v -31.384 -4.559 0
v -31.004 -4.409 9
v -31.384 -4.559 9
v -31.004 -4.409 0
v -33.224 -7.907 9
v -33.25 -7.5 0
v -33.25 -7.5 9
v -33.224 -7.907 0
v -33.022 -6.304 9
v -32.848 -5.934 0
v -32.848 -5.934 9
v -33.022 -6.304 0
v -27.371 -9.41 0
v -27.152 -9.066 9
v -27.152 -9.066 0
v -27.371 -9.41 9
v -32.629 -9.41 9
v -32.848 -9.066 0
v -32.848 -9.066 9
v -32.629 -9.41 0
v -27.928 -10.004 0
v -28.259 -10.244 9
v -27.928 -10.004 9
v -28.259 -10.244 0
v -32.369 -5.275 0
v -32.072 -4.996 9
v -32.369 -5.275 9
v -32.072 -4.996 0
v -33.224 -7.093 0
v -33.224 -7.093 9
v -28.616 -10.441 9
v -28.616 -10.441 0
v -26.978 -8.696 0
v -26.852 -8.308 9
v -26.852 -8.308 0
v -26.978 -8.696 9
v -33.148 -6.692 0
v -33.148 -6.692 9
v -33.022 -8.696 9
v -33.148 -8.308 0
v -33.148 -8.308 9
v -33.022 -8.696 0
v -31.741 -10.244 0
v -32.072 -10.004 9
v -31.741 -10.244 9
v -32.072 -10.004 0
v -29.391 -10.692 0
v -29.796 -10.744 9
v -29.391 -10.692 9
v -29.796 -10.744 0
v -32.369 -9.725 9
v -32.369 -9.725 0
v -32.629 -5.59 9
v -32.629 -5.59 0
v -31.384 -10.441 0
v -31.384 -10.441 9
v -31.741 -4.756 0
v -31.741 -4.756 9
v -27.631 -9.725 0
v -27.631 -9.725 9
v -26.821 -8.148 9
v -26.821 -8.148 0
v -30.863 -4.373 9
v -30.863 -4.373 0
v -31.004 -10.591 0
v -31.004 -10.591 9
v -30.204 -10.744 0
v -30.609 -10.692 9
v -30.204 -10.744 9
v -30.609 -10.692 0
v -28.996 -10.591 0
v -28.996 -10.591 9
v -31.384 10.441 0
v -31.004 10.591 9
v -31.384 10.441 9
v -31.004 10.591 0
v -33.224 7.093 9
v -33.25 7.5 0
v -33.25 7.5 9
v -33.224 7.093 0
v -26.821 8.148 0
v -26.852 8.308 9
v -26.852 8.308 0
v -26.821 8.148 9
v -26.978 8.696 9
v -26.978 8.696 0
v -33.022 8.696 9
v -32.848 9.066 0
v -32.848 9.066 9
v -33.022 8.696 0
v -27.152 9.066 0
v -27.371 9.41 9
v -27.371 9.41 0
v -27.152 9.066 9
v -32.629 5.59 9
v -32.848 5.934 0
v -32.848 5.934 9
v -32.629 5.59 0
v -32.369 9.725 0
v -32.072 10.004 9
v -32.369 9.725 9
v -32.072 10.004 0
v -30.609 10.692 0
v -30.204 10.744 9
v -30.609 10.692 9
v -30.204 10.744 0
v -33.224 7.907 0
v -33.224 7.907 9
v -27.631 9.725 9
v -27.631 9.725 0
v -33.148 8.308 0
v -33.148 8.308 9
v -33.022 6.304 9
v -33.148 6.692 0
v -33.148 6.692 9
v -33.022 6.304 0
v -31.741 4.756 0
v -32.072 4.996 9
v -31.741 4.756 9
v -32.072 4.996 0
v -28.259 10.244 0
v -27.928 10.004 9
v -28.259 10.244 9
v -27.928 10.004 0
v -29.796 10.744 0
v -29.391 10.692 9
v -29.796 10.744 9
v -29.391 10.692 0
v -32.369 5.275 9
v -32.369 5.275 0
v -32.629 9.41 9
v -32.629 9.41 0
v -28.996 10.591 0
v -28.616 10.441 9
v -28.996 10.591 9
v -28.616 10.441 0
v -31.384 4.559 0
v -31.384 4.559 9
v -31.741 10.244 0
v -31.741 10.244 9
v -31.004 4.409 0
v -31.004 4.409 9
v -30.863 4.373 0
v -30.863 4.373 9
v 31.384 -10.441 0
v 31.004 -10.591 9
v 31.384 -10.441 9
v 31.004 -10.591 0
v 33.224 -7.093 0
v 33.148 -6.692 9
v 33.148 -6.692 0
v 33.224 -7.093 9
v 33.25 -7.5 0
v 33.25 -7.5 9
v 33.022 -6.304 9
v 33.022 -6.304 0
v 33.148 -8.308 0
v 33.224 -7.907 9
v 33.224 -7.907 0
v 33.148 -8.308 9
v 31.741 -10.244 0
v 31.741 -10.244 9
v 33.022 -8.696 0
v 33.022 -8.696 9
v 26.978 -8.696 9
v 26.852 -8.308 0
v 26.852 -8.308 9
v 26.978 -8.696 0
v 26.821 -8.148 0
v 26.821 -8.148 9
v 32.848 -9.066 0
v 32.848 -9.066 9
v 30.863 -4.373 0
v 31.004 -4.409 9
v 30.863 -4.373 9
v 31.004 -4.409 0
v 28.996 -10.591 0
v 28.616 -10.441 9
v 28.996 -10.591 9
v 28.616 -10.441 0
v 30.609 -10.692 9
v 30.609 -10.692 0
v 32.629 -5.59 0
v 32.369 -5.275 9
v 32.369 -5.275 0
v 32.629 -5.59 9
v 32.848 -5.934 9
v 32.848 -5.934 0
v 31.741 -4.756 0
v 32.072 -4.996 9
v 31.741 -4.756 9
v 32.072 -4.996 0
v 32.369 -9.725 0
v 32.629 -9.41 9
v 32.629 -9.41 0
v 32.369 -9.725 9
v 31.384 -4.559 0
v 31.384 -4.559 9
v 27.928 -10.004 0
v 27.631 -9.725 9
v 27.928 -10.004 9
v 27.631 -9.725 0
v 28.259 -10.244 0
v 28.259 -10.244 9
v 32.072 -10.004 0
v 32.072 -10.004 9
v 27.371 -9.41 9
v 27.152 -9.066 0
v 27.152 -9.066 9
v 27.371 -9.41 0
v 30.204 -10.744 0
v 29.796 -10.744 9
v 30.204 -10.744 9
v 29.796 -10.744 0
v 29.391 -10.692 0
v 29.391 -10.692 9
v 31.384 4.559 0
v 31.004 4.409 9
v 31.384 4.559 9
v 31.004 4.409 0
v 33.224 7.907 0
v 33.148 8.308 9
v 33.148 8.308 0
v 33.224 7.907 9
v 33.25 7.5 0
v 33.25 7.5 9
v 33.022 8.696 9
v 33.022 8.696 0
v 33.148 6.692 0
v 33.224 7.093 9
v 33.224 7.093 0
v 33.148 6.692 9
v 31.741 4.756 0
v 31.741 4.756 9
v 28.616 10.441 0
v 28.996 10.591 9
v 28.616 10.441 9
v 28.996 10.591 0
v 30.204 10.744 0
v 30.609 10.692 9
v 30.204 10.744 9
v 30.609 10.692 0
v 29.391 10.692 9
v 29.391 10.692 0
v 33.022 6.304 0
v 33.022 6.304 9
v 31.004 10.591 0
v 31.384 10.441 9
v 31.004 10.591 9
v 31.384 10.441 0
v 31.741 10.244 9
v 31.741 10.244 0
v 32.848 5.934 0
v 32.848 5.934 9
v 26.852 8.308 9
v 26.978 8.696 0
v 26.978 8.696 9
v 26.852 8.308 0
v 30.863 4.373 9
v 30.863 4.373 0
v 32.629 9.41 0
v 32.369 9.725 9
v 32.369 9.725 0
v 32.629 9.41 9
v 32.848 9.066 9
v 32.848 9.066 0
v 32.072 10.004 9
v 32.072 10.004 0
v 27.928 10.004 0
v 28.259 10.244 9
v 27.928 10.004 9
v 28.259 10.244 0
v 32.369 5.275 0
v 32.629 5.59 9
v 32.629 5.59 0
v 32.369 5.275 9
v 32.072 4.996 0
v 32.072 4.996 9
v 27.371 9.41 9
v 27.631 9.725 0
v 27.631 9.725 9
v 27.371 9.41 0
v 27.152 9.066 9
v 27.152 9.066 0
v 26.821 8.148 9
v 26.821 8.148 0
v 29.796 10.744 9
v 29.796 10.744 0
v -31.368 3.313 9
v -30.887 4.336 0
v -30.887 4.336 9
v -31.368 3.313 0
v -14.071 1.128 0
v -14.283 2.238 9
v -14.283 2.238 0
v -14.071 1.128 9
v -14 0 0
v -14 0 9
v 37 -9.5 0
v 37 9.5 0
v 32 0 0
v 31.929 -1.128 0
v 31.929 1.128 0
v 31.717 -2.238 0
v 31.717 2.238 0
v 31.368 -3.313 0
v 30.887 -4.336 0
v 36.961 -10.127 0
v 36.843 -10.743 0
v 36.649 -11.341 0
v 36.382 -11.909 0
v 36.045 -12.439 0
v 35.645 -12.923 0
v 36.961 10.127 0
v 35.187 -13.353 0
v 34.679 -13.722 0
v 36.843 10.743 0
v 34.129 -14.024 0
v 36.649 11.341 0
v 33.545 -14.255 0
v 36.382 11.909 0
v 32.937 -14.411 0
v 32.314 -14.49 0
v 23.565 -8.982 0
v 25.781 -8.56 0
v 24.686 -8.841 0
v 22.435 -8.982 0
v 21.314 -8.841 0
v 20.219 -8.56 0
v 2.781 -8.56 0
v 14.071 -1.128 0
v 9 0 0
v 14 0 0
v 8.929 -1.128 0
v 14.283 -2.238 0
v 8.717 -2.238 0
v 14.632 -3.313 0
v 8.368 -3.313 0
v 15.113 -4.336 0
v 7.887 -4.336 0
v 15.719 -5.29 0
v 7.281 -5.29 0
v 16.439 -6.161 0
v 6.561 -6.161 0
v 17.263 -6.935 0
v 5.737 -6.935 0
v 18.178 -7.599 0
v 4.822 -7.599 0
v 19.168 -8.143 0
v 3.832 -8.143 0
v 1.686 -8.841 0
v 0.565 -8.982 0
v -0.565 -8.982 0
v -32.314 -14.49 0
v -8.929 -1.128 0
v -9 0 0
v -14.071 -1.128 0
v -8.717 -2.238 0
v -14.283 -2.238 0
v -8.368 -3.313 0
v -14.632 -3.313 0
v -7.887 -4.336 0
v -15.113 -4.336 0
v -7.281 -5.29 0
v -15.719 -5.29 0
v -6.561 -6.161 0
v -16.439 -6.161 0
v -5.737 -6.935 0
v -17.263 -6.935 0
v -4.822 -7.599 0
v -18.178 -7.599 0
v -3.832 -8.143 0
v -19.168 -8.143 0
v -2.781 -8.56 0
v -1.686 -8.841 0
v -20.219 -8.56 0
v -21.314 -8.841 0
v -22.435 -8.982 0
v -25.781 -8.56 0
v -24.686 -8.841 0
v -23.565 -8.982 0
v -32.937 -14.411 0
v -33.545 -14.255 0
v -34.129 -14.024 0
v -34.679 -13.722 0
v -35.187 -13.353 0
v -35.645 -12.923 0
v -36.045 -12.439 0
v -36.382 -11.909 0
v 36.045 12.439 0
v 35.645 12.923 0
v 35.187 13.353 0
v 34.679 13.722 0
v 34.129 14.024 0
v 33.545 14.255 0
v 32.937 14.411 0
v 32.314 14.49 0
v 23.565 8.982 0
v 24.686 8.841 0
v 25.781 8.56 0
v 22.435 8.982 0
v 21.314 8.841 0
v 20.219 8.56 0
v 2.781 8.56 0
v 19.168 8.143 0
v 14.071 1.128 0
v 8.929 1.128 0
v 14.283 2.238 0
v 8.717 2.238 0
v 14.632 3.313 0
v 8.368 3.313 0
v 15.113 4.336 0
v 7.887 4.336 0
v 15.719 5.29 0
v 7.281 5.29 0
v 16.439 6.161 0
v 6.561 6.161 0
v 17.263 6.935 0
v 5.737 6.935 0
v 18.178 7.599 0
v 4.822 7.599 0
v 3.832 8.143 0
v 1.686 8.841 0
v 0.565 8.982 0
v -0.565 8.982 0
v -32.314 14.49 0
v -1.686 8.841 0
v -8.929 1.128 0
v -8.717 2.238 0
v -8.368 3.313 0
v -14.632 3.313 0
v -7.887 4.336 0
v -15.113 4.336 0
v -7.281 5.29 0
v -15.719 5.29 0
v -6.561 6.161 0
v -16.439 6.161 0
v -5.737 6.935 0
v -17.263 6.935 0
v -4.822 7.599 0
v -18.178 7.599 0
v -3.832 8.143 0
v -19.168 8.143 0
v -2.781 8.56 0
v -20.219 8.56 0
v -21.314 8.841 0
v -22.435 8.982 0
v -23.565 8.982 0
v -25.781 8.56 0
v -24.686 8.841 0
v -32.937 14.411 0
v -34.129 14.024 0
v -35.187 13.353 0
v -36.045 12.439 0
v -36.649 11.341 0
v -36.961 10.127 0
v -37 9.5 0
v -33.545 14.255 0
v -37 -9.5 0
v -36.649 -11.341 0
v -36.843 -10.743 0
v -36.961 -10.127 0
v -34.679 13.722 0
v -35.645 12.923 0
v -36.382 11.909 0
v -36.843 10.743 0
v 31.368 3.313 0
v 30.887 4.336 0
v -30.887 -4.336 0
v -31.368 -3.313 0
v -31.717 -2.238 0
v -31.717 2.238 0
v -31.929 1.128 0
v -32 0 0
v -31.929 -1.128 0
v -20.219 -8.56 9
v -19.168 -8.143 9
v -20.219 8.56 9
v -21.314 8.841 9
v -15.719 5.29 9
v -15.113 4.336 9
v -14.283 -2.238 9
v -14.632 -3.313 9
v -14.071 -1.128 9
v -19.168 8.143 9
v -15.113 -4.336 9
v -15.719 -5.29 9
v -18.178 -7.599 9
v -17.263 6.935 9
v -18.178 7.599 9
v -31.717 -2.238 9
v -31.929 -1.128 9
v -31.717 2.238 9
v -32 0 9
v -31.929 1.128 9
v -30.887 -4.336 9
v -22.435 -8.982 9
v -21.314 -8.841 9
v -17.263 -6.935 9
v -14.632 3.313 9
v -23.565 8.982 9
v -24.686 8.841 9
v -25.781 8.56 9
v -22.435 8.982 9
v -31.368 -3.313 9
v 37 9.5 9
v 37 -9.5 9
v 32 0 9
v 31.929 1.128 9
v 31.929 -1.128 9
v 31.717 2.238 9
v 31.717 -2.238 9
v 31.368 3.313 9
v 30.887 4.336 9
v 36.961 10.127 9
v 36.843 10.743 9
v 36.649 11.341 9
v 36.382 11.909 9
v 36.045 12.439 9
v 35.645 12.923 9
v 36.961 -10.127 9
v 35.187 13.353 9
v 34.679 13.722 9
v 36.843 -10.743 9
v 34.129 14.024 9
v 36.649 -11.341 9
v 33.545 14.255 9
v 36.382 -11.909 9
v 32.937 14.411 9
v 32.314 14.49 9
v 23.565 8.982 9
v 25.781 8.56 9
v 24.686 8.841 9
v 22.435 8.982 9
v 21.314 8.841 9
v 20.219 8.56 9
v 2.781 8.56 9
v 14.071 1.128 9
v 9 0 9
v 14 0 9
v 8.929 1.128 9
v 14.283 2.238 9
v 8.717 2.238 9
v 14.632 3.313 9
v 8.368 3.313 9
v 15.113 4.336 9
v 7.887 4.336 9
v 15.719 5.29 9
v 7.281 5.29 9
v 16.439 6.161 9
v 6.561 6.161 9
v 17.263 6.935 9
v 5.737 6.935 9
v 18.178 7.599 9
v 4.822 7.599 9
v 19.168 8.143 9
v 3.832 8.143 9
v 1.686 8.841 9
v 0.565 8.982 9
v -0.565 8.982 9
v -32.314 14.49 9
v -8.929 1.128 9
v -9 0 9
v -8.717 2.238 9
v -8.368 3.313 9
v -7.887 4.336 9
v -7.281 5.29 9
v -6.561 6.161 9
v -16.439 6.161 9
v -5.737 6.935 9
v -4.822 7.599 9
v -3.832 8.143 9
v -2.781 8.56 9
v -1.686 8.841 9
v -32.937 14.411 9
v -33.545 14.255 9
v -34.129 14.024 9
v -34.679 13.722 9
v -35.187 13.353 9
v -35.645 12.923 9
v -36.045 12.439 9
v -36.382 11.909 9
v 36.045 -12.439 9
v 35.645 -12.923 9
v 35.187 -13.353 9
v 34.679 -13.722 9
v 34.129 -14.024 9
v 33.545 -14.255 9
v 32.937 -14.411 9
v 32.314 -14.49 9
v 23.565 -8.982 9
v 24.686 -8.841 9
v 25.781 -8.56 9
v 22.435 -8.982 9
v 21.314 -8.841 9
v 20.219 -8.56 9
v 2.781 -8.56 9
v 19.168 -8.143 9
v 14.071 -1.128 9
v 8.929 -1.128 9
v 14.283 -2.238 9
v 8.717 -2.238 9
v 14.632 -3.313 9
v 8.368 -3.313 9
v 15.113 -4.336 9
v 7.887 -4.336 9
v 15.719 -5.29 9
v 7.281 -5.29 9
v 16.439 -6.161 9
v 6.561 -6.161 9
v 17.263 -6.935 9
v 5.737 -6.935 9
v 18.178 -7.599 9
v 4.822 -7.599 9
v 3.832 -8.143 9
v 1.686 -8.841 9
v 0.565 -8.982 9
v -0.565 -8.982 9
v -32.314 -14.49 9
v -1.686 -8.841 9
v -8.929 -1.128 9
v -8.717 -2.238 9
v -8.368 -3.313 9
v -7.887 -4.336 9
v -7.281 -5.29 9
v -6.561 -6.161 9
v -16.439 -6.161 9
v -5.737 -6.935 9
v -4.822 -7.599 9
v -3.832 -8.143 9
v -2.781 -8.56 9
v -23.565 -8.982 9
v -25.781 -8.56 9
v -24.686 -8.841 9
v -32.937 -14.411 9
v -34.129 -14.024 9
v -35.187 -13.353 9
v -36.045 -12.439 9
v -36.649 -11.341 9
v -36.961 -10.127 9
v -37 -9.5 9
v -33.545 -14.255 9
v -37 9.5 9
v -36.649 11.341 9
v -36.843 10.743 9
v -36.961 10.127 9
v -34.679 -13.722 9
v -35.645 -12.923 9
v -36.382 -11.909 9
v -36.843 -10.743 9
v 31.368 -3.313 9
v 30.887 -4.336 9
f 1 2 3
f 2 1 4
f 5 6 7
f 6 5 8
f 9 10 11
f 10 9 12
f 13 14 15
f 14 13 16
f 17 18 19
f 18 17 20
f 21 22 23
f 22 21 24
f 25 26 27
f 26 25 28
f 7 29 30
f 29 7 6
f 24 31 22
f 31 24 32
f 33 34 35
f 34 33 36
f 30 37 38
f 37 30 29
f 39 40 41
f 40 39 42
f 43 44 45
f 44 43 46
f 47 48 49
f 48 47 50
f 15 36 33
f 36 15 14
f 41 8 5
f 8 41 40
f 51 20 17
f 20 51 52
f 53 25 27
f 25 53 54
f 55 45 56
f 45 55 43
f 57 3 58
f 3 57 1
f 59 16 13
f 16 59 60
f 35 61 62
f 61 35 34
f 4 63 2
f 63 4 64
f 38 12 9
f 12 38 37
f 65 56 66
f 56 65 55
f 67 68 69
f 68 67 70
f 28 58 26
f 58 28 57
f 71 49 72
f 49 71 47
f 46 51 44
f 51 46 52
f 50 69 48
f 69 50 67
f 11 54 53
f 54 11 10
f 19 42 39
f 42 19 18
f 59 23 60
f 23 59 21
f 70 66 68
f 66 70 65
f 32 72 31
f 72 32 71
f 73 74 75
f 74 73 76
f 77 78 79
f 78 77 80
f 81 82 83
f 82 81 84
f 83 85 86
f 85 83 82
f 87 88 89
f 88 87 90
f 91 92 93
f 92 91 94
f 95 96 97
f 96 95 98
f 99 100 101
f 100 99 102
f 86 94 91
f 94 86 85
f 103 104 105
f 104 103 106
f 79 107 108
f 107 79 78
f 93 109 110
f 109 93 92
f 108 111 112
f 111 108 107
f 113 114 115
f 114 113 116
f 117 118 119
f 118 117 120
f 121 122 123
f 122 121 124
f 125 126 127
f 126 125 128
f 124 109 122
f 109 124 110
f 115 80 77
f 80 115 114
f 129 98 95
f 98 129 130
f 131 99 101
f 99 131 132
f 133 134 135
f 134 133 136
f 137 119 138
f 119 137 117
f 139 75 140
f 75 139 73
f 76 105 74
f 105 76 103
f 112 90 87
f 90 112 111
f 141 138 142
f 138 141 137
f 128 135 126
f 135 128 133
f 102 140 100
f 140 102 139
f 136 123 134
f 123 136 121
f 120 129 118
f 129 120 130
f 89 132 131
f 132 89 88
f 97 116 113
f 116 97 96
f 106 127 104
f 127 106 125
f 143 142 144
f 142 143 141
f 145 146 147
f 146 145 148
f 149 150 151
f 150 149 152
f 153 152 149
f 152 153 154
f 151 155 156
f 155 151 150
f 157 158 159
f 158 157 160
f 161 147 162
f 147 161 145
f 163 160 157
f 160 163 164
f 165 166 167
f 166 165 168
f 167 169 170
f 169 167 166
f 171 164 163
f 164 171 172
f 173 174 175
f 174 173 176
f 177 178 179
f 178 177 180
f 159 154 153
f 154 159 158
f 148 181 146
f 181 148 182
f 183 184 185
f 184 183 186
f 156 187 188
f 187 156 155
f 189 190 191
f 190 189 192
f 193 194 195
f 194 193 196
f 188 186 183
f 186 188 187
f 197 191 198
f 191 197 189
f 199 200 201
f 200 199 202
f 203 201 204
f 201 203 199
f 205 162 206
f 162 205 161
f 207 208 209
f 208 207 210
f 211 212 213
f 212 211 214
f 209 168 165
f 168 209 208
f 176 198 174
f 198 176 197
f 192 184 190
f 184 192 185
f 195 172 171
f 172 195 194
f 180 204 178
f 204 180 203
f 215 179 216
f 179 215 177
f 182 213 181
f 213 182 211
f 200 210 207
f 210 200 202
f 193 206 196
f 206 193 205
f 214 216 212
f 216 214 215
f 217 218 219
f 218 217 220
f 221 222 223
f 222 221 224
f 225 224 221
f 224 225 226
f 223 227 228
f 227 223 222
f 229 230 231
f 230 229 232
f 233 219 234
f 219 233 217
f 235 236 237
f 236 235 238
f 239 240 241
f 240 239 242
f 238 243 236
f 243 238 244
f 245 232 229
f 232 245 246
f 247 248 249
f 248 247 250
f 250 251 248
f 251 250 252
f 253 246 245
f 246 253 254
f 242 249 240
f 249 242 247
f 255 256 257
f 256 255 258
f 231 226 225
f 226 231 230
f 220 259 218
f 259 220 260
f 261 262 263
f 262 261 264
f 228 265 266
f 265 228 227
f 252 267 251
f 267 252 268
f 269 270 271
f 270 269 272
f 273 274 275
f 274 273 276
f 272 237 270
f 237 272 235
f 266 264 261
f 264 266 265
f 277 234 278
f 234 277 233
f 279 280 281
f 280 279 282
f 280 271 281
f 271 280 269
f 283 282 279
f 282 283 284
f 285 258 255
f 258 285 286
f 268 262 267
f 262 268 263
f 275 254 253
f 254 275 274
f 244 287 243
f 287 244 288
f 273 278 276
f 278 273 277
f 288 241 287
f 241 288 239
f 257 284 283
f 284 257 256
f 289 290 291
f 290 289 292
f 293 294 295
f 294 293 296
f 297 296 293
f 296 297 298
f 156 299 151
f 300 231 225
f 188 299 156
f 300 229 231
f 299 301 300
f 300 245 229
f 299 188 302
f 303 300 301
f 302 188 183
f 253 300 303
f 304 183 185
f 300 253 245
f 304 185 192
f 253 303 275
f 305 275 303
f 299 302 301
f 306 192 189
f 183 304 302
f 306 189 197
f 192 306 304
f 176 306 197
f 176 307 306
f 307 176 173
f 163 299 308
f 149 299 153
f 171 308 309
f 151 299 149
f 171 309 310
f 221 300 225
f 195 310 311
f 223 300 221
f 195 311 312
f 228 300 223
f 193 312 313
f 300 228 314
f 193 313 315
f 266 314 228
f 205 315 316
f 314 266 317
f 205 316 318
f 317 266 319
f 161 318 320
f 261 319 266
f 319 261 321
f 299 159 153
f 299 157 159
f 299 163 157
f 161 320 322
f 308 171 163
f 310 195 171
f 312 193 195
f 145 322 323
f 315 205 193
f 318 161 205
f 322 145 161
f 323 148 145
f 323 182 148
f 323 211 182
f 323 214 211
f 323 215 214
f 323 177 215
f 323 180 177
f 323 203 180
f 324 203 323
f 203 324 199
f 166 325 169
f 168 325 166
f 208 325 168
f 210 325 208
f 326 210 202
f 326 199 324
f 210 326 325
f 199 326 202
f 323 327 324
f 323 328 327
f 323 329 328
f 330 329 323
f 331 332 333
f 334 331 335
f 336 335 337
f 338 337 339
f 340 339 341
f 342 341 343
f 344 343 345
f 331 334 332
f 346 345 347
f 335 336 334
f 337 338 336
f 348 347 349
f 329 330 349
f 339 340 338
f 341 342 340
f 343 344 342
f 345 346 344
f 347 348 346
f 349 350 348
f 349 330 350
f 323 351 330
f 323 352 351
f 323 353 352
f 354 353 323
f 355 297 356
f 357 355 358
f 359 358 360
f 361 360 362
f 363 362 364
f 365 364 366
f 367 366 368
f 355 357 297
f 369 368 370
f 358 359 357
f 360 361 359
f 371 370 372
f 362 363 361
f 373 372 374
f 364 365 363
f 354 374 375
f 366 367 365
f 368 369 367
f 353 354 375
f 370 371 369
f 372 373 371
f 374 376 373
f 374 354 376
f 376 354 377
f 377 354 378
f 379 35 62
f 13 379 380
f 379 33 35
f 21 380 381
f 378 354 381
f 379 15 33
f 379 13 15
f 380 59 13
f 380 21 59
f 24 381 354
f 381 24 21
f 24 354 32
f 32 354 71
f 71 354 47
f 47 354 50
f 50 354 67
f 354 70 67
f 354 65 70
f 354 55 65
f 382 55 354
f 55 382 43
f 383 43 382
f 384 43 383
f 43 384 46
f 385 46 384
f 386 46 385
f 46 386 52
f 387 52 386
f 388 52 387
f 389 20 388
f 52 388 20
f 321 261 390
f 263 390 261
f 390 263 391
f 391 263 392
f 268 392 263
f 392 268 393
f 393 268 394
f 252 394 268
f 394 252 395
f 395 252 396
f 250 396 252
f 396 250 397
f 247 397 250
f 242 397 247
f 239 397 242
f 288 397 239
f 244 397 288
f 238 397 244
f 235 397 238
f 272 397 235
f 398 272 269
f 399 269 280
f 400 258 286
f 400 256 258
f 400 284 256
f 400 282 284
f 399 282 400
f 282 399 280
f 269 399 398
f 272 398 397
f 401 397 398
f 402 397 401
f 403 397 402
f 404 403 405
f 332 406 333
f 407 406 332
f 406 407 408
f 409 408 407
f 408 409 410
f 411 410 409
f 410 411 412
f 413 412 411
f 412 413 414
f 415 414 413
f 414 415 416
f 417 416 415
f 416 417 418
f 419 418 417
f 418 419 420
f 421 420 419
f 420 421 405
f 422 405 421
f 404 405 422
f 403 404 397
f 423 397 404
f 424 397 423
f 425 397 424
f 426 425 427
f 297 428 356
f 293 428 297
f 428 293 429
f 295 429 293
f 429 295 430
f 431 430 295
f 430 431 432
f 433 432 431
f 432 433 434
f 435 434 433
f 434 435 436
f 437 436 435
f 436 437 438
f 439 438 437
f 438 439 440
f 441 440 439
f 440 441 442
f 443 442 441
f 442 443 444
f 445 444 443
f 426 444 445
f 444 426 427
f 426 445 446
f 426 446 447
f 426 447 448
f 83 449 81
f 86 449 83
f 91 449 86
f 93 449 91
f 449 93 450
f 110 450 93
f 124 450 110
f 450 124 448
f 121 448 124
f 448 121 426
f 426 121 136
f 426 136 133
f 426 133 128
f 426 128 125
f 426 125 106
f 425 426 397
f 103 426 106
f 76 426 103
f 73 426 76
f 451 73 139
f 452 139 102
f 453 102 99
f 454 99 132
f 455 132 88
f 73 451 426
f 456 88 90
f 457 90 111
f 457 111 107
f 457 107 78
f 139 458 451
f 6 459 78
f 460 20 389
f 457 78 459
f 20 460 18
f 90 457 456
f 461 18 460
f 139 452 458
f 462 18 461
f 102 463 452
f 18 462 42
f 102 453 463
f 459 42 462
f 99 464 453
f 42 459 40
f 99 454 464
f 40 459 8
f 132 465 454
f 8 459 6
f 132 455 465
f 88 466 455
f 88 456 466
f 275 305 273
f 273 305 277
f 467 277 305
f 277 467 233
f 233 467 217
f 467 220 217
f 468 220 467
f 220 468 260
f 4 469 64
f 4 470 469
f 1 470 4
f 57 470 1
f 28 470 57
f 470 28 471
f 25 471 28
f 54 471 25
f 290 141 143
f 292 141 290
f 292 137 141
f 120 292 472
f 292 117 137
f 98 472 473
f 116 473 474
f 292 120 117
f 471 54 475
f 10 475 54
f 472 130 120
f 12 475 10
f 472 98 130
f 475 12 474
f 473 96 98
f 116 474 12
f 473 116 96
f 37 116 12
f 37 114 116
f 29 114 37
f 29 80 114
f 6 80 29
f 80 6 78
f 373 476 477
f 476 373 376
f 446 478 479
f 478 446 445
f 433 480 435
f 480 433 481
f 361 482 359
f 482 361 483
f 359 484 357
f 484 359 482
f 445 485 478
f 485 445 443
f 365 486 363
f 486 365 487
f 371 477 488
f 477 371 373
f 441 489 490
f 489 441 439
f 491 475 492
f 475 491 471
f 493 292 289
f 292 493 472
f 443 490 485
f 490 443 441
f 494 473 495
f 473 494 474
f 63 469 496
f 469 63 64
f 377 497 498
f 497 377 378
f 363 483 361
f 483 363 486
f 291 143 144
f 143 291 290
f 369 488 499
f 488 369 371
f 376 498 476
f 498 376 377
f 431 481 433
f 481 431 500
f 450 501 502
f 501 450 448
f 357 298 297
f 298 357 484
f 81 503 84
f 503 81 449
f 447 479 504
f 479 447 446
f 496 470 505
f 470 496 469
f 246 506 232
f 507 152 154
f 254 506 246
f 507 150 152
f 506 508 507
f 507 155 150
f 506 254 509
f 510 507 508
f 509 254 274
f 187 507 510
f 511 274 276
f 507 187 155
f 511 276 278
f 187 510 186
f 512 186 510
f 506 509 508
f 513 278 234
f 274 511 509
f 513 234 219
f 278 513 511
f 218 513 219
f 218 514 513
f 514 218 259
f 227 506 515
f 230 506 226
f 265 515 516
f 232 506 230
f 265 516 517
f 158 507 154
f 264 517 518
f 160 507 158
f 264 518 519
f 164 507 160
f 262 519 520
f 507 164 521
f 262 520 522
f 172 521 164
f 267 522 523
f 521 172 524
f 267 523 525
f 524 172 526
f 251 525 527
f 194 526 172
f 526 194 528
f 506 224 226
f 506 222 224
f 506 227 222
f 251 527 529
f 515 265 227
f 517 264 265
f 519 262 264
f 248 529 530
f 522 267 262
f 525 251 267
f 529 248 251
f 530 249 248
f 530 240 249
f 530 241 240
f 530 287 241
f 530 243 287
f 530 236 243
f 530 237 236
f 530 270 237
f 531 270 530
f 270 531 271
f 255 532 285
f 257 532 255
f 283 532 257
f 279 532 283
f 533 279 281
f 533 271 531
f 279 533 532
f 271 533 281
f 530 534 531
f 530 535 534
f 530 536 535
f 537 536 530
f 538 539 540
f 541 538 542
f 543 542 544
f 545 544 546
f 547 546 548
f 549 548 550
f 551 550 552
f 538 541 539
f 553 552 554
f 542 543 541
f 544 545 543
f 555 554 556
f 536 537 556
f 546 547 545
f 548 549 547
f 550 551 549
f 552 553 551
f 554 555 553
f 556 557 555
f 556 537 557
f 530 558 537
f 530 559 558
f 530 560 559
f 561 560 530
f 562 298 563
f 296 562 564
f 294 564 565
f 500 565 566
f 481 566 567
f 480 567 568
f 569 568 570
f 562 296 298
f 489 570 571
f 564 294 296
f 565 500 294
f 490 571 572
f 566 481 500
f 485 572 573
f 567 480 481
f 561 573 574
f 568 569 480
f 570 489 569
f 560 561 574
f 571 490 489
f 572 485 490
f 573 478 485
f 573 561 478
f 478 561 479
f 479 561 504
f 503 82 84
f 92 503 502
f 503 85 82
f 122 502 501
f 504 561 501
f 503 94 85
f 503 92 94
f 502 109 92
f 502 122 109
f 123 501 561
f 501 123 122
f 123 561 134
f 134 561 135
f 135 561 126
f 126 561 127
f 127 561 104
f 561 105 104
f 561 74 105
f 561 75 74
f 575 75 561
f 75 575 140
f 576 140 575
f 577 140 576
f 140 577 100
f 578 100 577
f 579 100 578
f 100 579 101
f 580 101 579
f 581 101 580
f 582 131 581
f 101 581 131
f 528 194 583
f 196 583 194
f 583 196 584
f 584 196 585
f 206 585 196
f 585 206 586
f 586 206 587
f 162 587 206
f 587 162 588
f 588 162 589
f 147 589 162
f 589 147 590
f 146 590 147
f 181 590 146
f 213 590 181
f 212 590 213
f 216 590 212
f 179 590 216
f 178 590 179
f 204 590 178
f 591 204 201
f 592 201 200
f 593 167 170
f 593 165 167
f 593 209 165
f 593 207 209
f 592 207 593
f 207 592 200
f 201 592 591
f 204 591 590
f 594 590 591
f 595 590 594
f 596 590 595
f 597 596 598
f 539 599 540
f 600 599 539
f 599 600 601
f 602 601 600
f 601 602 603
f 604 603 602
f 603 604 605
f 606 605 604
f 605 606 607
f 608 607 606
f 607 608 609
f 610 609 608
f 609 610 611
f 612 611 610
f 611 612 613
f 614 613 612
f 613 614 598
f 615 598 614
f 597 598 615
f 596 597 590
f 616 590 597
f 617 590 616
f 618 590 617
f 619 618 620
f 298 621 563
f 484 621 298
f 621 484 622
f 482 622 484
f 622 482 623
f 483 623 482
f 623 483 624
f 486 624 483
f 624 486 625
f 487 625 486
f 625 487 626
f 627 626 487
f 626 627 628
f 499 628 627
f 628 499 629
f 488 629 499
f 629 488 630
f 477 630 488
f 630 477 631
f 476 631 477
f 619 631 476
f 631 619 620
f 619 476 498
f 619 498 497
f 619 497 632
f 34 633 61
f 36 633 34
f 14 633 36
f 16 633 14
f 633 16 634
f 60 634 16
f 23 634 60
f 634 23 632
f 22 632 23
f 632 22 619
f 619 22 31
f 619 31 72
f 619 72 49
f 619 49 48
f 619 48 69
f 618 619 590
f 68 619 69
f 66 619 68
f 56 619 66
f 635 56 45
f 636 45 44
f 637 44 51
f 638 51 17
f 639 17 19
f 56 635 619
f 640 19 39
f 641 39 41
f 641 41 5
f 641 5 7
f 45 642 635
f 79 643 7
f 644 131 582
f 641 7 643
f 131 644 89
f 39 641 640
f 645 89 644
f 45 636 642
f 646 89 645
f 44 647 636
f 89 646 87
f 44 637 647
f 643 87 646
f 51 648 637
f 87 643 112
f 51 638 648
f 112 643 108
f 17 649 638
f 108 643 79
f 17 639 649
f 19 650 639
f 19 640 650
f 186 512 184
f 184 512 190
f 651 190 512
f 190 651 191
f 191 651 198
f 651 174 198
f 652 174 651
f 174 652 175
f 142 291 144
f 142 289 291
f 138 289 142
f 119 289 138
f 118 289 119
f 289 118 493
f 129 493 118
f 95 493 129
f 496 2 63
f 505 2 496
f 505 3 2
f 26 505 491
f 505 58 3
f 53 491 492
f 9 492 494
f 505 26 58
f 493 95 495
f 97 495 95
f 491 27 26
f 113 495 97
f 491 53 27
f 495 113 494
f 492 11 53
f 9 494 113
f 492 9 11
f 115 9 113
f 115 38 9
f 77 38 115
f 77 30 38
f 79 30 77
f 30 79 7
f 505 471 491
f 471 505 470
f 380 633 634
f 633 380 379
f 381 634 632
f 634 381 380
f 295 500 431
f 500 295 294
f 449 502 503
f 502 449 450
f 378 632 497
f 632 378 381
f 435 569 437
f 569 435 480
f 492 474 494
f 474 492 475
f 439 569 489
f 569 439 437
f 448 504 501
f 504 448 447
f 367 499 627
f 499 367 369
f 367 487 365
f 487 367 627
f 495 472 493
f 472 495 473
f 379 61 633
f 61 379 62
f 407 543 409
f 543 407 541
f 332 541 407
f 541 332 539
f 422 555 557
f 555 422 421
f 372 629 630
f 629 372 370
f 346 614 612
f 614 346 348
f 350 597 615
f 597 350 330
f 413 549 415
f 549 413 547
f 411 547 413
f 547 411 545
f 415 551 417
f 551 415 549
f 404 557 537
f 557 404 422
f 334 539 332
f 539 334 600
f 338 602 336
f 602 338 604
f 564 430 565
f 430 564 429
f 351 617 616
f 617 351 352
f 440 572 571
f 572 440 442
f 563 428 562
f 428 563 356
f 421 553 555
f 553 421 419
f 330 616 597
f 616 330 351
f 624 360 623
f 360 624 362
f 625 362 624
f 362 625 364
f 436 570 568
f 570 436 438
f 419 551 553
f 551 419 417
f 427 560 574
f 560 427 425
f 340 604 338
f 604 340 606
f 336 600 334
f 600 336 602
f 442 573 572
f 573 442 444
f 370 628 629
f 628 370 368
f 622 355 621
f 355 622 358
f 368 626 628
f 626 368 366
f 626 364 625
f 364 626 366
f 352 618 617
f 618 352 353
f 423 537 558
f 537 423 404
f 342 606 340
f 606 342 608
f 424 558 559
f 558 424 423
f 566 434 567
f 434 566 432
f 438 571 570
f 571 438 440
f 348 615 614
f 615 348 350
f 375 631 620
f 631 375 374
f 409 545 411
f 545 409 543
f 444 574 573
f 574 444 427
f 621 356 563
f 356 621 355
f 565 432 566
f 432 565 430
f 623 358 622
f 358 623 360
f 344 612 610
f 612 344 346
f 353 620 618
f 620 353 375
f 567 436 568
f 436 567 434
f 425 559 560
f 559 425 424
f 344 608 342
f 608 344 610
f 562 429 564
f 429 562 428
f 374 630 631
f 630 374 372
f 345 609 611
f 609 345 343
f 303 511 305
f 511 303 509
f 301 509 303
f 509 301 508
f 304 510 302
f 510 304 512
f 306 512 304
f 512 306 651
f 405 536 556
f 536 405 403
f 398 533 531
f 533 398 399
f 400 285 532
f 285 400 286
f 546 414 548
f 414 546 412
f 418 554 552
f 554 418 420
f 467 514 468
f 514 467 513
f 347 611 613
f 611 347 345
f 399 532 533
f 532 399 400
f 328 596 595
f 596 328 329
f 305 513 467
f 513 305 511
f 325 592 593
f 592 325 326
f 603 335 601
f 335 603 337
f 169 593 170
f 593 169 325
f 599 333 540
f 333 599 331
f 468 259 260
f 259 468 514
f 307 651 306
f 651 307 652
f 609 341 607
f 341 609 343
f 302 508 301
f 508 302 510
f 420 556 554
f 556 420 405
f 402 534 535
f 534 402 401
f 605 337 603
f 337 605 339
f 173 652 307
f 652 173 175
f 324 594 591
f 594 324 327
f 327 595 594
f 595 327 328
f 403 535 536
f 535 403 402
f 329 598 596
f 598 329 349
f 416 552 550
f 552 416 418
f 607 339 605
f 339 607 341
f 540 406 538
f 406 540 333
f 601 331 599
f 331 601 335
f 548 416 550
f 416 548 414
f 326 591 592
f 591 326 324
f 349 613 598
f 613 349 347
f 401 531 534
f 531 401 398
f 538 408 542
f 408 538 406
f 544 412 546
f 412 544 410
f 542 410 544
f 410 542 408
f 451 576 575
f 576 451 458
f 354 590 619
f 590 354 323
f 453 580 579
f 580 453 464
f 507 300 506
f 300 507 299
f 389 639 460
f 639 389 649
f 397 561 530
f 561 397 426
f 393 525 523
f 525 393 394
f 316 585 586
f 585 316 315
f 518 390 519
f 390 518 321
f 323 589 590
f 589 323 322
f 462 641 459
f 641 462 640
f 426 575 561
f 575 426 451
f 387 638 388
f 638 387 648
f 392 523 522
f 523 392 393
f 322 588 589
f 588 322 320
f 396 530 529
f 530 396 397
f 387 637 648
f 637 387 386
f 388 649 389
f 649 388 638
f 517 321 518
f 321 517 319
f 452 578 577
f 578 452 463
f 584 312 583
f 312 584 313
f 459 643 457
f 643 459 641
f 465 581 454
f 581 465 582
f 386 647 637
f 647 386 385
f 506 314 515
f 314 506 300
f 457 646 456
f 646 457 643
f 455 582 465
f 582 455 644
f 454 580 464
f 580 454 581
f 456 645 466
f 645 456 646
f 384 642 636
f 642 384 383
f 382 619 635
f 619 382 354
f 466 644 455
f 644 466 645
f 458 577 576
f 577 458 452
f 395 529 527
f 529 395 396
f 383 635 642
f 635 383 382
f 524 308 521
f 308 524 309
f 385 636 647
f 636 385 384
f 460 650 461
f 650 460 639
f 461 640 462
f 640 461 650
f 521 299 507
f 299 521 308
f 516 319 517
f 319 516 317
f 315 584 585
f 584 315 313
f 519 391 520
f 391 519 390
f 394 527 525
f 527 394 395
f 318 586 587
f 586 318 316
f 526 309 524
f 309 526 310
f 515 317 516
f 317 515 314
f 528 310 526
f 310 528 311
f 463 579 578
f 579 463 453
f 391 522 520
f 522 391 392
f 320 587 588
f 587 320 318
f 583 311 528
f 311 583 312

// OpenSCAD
$fn = 50;


difference() {
	union() {
		hull() {
			translate(v = [-32.0000000000, 9.5000000000, 0]) {
				cylinder(h = 9, r = 5);
			}
			translate(v = [32.0000000000, 9.5000000000, 0]) {
				cylinder(h = 9, r = 5);
			}
			translate(v = [-32.0000000000, -9.5000000000, 0]) {
				cylinder(h = 9, r = 5);
			}
			translate(v = [32.0000000000, -9.5000000000, 0]) {
				cylinder(h = 9, r = 5);
			}
		}
	}
	union() {
		#translate(v = [-30.0000000000, -7.5000000000, -100.0000000000]) {
			cylinder(h = 200, r = 3.2500000000);
		}
		#translate(v = [-30.0000000000, 7.5000000000, -100.0000000000]) {
			cylinder(h = 200, r = 3.2500000000);
		}
		#translate(v = [30.0000000000, -7.5000000000, -100.0000000000]) {
			cylinder(h = 200, r = 3.2500000000);
		}
		#translate(v = [30.0000000000, 7.5000000000, -100.0000000000]) {
			cylinder(h = 200, r = 3.2500000000);
		}
		#translate(v = [-23.0000000000, 0, 0]) {
			cylinder(h = 9, r = 9.0000000000);
		}
		#cylinder(h = 9, r = 9.0000000000);
		#translate(v = [23.0000000000, 0, 0]) {
			cylinder(h = 9, r = 9.0000000000);
		}
	}
}
